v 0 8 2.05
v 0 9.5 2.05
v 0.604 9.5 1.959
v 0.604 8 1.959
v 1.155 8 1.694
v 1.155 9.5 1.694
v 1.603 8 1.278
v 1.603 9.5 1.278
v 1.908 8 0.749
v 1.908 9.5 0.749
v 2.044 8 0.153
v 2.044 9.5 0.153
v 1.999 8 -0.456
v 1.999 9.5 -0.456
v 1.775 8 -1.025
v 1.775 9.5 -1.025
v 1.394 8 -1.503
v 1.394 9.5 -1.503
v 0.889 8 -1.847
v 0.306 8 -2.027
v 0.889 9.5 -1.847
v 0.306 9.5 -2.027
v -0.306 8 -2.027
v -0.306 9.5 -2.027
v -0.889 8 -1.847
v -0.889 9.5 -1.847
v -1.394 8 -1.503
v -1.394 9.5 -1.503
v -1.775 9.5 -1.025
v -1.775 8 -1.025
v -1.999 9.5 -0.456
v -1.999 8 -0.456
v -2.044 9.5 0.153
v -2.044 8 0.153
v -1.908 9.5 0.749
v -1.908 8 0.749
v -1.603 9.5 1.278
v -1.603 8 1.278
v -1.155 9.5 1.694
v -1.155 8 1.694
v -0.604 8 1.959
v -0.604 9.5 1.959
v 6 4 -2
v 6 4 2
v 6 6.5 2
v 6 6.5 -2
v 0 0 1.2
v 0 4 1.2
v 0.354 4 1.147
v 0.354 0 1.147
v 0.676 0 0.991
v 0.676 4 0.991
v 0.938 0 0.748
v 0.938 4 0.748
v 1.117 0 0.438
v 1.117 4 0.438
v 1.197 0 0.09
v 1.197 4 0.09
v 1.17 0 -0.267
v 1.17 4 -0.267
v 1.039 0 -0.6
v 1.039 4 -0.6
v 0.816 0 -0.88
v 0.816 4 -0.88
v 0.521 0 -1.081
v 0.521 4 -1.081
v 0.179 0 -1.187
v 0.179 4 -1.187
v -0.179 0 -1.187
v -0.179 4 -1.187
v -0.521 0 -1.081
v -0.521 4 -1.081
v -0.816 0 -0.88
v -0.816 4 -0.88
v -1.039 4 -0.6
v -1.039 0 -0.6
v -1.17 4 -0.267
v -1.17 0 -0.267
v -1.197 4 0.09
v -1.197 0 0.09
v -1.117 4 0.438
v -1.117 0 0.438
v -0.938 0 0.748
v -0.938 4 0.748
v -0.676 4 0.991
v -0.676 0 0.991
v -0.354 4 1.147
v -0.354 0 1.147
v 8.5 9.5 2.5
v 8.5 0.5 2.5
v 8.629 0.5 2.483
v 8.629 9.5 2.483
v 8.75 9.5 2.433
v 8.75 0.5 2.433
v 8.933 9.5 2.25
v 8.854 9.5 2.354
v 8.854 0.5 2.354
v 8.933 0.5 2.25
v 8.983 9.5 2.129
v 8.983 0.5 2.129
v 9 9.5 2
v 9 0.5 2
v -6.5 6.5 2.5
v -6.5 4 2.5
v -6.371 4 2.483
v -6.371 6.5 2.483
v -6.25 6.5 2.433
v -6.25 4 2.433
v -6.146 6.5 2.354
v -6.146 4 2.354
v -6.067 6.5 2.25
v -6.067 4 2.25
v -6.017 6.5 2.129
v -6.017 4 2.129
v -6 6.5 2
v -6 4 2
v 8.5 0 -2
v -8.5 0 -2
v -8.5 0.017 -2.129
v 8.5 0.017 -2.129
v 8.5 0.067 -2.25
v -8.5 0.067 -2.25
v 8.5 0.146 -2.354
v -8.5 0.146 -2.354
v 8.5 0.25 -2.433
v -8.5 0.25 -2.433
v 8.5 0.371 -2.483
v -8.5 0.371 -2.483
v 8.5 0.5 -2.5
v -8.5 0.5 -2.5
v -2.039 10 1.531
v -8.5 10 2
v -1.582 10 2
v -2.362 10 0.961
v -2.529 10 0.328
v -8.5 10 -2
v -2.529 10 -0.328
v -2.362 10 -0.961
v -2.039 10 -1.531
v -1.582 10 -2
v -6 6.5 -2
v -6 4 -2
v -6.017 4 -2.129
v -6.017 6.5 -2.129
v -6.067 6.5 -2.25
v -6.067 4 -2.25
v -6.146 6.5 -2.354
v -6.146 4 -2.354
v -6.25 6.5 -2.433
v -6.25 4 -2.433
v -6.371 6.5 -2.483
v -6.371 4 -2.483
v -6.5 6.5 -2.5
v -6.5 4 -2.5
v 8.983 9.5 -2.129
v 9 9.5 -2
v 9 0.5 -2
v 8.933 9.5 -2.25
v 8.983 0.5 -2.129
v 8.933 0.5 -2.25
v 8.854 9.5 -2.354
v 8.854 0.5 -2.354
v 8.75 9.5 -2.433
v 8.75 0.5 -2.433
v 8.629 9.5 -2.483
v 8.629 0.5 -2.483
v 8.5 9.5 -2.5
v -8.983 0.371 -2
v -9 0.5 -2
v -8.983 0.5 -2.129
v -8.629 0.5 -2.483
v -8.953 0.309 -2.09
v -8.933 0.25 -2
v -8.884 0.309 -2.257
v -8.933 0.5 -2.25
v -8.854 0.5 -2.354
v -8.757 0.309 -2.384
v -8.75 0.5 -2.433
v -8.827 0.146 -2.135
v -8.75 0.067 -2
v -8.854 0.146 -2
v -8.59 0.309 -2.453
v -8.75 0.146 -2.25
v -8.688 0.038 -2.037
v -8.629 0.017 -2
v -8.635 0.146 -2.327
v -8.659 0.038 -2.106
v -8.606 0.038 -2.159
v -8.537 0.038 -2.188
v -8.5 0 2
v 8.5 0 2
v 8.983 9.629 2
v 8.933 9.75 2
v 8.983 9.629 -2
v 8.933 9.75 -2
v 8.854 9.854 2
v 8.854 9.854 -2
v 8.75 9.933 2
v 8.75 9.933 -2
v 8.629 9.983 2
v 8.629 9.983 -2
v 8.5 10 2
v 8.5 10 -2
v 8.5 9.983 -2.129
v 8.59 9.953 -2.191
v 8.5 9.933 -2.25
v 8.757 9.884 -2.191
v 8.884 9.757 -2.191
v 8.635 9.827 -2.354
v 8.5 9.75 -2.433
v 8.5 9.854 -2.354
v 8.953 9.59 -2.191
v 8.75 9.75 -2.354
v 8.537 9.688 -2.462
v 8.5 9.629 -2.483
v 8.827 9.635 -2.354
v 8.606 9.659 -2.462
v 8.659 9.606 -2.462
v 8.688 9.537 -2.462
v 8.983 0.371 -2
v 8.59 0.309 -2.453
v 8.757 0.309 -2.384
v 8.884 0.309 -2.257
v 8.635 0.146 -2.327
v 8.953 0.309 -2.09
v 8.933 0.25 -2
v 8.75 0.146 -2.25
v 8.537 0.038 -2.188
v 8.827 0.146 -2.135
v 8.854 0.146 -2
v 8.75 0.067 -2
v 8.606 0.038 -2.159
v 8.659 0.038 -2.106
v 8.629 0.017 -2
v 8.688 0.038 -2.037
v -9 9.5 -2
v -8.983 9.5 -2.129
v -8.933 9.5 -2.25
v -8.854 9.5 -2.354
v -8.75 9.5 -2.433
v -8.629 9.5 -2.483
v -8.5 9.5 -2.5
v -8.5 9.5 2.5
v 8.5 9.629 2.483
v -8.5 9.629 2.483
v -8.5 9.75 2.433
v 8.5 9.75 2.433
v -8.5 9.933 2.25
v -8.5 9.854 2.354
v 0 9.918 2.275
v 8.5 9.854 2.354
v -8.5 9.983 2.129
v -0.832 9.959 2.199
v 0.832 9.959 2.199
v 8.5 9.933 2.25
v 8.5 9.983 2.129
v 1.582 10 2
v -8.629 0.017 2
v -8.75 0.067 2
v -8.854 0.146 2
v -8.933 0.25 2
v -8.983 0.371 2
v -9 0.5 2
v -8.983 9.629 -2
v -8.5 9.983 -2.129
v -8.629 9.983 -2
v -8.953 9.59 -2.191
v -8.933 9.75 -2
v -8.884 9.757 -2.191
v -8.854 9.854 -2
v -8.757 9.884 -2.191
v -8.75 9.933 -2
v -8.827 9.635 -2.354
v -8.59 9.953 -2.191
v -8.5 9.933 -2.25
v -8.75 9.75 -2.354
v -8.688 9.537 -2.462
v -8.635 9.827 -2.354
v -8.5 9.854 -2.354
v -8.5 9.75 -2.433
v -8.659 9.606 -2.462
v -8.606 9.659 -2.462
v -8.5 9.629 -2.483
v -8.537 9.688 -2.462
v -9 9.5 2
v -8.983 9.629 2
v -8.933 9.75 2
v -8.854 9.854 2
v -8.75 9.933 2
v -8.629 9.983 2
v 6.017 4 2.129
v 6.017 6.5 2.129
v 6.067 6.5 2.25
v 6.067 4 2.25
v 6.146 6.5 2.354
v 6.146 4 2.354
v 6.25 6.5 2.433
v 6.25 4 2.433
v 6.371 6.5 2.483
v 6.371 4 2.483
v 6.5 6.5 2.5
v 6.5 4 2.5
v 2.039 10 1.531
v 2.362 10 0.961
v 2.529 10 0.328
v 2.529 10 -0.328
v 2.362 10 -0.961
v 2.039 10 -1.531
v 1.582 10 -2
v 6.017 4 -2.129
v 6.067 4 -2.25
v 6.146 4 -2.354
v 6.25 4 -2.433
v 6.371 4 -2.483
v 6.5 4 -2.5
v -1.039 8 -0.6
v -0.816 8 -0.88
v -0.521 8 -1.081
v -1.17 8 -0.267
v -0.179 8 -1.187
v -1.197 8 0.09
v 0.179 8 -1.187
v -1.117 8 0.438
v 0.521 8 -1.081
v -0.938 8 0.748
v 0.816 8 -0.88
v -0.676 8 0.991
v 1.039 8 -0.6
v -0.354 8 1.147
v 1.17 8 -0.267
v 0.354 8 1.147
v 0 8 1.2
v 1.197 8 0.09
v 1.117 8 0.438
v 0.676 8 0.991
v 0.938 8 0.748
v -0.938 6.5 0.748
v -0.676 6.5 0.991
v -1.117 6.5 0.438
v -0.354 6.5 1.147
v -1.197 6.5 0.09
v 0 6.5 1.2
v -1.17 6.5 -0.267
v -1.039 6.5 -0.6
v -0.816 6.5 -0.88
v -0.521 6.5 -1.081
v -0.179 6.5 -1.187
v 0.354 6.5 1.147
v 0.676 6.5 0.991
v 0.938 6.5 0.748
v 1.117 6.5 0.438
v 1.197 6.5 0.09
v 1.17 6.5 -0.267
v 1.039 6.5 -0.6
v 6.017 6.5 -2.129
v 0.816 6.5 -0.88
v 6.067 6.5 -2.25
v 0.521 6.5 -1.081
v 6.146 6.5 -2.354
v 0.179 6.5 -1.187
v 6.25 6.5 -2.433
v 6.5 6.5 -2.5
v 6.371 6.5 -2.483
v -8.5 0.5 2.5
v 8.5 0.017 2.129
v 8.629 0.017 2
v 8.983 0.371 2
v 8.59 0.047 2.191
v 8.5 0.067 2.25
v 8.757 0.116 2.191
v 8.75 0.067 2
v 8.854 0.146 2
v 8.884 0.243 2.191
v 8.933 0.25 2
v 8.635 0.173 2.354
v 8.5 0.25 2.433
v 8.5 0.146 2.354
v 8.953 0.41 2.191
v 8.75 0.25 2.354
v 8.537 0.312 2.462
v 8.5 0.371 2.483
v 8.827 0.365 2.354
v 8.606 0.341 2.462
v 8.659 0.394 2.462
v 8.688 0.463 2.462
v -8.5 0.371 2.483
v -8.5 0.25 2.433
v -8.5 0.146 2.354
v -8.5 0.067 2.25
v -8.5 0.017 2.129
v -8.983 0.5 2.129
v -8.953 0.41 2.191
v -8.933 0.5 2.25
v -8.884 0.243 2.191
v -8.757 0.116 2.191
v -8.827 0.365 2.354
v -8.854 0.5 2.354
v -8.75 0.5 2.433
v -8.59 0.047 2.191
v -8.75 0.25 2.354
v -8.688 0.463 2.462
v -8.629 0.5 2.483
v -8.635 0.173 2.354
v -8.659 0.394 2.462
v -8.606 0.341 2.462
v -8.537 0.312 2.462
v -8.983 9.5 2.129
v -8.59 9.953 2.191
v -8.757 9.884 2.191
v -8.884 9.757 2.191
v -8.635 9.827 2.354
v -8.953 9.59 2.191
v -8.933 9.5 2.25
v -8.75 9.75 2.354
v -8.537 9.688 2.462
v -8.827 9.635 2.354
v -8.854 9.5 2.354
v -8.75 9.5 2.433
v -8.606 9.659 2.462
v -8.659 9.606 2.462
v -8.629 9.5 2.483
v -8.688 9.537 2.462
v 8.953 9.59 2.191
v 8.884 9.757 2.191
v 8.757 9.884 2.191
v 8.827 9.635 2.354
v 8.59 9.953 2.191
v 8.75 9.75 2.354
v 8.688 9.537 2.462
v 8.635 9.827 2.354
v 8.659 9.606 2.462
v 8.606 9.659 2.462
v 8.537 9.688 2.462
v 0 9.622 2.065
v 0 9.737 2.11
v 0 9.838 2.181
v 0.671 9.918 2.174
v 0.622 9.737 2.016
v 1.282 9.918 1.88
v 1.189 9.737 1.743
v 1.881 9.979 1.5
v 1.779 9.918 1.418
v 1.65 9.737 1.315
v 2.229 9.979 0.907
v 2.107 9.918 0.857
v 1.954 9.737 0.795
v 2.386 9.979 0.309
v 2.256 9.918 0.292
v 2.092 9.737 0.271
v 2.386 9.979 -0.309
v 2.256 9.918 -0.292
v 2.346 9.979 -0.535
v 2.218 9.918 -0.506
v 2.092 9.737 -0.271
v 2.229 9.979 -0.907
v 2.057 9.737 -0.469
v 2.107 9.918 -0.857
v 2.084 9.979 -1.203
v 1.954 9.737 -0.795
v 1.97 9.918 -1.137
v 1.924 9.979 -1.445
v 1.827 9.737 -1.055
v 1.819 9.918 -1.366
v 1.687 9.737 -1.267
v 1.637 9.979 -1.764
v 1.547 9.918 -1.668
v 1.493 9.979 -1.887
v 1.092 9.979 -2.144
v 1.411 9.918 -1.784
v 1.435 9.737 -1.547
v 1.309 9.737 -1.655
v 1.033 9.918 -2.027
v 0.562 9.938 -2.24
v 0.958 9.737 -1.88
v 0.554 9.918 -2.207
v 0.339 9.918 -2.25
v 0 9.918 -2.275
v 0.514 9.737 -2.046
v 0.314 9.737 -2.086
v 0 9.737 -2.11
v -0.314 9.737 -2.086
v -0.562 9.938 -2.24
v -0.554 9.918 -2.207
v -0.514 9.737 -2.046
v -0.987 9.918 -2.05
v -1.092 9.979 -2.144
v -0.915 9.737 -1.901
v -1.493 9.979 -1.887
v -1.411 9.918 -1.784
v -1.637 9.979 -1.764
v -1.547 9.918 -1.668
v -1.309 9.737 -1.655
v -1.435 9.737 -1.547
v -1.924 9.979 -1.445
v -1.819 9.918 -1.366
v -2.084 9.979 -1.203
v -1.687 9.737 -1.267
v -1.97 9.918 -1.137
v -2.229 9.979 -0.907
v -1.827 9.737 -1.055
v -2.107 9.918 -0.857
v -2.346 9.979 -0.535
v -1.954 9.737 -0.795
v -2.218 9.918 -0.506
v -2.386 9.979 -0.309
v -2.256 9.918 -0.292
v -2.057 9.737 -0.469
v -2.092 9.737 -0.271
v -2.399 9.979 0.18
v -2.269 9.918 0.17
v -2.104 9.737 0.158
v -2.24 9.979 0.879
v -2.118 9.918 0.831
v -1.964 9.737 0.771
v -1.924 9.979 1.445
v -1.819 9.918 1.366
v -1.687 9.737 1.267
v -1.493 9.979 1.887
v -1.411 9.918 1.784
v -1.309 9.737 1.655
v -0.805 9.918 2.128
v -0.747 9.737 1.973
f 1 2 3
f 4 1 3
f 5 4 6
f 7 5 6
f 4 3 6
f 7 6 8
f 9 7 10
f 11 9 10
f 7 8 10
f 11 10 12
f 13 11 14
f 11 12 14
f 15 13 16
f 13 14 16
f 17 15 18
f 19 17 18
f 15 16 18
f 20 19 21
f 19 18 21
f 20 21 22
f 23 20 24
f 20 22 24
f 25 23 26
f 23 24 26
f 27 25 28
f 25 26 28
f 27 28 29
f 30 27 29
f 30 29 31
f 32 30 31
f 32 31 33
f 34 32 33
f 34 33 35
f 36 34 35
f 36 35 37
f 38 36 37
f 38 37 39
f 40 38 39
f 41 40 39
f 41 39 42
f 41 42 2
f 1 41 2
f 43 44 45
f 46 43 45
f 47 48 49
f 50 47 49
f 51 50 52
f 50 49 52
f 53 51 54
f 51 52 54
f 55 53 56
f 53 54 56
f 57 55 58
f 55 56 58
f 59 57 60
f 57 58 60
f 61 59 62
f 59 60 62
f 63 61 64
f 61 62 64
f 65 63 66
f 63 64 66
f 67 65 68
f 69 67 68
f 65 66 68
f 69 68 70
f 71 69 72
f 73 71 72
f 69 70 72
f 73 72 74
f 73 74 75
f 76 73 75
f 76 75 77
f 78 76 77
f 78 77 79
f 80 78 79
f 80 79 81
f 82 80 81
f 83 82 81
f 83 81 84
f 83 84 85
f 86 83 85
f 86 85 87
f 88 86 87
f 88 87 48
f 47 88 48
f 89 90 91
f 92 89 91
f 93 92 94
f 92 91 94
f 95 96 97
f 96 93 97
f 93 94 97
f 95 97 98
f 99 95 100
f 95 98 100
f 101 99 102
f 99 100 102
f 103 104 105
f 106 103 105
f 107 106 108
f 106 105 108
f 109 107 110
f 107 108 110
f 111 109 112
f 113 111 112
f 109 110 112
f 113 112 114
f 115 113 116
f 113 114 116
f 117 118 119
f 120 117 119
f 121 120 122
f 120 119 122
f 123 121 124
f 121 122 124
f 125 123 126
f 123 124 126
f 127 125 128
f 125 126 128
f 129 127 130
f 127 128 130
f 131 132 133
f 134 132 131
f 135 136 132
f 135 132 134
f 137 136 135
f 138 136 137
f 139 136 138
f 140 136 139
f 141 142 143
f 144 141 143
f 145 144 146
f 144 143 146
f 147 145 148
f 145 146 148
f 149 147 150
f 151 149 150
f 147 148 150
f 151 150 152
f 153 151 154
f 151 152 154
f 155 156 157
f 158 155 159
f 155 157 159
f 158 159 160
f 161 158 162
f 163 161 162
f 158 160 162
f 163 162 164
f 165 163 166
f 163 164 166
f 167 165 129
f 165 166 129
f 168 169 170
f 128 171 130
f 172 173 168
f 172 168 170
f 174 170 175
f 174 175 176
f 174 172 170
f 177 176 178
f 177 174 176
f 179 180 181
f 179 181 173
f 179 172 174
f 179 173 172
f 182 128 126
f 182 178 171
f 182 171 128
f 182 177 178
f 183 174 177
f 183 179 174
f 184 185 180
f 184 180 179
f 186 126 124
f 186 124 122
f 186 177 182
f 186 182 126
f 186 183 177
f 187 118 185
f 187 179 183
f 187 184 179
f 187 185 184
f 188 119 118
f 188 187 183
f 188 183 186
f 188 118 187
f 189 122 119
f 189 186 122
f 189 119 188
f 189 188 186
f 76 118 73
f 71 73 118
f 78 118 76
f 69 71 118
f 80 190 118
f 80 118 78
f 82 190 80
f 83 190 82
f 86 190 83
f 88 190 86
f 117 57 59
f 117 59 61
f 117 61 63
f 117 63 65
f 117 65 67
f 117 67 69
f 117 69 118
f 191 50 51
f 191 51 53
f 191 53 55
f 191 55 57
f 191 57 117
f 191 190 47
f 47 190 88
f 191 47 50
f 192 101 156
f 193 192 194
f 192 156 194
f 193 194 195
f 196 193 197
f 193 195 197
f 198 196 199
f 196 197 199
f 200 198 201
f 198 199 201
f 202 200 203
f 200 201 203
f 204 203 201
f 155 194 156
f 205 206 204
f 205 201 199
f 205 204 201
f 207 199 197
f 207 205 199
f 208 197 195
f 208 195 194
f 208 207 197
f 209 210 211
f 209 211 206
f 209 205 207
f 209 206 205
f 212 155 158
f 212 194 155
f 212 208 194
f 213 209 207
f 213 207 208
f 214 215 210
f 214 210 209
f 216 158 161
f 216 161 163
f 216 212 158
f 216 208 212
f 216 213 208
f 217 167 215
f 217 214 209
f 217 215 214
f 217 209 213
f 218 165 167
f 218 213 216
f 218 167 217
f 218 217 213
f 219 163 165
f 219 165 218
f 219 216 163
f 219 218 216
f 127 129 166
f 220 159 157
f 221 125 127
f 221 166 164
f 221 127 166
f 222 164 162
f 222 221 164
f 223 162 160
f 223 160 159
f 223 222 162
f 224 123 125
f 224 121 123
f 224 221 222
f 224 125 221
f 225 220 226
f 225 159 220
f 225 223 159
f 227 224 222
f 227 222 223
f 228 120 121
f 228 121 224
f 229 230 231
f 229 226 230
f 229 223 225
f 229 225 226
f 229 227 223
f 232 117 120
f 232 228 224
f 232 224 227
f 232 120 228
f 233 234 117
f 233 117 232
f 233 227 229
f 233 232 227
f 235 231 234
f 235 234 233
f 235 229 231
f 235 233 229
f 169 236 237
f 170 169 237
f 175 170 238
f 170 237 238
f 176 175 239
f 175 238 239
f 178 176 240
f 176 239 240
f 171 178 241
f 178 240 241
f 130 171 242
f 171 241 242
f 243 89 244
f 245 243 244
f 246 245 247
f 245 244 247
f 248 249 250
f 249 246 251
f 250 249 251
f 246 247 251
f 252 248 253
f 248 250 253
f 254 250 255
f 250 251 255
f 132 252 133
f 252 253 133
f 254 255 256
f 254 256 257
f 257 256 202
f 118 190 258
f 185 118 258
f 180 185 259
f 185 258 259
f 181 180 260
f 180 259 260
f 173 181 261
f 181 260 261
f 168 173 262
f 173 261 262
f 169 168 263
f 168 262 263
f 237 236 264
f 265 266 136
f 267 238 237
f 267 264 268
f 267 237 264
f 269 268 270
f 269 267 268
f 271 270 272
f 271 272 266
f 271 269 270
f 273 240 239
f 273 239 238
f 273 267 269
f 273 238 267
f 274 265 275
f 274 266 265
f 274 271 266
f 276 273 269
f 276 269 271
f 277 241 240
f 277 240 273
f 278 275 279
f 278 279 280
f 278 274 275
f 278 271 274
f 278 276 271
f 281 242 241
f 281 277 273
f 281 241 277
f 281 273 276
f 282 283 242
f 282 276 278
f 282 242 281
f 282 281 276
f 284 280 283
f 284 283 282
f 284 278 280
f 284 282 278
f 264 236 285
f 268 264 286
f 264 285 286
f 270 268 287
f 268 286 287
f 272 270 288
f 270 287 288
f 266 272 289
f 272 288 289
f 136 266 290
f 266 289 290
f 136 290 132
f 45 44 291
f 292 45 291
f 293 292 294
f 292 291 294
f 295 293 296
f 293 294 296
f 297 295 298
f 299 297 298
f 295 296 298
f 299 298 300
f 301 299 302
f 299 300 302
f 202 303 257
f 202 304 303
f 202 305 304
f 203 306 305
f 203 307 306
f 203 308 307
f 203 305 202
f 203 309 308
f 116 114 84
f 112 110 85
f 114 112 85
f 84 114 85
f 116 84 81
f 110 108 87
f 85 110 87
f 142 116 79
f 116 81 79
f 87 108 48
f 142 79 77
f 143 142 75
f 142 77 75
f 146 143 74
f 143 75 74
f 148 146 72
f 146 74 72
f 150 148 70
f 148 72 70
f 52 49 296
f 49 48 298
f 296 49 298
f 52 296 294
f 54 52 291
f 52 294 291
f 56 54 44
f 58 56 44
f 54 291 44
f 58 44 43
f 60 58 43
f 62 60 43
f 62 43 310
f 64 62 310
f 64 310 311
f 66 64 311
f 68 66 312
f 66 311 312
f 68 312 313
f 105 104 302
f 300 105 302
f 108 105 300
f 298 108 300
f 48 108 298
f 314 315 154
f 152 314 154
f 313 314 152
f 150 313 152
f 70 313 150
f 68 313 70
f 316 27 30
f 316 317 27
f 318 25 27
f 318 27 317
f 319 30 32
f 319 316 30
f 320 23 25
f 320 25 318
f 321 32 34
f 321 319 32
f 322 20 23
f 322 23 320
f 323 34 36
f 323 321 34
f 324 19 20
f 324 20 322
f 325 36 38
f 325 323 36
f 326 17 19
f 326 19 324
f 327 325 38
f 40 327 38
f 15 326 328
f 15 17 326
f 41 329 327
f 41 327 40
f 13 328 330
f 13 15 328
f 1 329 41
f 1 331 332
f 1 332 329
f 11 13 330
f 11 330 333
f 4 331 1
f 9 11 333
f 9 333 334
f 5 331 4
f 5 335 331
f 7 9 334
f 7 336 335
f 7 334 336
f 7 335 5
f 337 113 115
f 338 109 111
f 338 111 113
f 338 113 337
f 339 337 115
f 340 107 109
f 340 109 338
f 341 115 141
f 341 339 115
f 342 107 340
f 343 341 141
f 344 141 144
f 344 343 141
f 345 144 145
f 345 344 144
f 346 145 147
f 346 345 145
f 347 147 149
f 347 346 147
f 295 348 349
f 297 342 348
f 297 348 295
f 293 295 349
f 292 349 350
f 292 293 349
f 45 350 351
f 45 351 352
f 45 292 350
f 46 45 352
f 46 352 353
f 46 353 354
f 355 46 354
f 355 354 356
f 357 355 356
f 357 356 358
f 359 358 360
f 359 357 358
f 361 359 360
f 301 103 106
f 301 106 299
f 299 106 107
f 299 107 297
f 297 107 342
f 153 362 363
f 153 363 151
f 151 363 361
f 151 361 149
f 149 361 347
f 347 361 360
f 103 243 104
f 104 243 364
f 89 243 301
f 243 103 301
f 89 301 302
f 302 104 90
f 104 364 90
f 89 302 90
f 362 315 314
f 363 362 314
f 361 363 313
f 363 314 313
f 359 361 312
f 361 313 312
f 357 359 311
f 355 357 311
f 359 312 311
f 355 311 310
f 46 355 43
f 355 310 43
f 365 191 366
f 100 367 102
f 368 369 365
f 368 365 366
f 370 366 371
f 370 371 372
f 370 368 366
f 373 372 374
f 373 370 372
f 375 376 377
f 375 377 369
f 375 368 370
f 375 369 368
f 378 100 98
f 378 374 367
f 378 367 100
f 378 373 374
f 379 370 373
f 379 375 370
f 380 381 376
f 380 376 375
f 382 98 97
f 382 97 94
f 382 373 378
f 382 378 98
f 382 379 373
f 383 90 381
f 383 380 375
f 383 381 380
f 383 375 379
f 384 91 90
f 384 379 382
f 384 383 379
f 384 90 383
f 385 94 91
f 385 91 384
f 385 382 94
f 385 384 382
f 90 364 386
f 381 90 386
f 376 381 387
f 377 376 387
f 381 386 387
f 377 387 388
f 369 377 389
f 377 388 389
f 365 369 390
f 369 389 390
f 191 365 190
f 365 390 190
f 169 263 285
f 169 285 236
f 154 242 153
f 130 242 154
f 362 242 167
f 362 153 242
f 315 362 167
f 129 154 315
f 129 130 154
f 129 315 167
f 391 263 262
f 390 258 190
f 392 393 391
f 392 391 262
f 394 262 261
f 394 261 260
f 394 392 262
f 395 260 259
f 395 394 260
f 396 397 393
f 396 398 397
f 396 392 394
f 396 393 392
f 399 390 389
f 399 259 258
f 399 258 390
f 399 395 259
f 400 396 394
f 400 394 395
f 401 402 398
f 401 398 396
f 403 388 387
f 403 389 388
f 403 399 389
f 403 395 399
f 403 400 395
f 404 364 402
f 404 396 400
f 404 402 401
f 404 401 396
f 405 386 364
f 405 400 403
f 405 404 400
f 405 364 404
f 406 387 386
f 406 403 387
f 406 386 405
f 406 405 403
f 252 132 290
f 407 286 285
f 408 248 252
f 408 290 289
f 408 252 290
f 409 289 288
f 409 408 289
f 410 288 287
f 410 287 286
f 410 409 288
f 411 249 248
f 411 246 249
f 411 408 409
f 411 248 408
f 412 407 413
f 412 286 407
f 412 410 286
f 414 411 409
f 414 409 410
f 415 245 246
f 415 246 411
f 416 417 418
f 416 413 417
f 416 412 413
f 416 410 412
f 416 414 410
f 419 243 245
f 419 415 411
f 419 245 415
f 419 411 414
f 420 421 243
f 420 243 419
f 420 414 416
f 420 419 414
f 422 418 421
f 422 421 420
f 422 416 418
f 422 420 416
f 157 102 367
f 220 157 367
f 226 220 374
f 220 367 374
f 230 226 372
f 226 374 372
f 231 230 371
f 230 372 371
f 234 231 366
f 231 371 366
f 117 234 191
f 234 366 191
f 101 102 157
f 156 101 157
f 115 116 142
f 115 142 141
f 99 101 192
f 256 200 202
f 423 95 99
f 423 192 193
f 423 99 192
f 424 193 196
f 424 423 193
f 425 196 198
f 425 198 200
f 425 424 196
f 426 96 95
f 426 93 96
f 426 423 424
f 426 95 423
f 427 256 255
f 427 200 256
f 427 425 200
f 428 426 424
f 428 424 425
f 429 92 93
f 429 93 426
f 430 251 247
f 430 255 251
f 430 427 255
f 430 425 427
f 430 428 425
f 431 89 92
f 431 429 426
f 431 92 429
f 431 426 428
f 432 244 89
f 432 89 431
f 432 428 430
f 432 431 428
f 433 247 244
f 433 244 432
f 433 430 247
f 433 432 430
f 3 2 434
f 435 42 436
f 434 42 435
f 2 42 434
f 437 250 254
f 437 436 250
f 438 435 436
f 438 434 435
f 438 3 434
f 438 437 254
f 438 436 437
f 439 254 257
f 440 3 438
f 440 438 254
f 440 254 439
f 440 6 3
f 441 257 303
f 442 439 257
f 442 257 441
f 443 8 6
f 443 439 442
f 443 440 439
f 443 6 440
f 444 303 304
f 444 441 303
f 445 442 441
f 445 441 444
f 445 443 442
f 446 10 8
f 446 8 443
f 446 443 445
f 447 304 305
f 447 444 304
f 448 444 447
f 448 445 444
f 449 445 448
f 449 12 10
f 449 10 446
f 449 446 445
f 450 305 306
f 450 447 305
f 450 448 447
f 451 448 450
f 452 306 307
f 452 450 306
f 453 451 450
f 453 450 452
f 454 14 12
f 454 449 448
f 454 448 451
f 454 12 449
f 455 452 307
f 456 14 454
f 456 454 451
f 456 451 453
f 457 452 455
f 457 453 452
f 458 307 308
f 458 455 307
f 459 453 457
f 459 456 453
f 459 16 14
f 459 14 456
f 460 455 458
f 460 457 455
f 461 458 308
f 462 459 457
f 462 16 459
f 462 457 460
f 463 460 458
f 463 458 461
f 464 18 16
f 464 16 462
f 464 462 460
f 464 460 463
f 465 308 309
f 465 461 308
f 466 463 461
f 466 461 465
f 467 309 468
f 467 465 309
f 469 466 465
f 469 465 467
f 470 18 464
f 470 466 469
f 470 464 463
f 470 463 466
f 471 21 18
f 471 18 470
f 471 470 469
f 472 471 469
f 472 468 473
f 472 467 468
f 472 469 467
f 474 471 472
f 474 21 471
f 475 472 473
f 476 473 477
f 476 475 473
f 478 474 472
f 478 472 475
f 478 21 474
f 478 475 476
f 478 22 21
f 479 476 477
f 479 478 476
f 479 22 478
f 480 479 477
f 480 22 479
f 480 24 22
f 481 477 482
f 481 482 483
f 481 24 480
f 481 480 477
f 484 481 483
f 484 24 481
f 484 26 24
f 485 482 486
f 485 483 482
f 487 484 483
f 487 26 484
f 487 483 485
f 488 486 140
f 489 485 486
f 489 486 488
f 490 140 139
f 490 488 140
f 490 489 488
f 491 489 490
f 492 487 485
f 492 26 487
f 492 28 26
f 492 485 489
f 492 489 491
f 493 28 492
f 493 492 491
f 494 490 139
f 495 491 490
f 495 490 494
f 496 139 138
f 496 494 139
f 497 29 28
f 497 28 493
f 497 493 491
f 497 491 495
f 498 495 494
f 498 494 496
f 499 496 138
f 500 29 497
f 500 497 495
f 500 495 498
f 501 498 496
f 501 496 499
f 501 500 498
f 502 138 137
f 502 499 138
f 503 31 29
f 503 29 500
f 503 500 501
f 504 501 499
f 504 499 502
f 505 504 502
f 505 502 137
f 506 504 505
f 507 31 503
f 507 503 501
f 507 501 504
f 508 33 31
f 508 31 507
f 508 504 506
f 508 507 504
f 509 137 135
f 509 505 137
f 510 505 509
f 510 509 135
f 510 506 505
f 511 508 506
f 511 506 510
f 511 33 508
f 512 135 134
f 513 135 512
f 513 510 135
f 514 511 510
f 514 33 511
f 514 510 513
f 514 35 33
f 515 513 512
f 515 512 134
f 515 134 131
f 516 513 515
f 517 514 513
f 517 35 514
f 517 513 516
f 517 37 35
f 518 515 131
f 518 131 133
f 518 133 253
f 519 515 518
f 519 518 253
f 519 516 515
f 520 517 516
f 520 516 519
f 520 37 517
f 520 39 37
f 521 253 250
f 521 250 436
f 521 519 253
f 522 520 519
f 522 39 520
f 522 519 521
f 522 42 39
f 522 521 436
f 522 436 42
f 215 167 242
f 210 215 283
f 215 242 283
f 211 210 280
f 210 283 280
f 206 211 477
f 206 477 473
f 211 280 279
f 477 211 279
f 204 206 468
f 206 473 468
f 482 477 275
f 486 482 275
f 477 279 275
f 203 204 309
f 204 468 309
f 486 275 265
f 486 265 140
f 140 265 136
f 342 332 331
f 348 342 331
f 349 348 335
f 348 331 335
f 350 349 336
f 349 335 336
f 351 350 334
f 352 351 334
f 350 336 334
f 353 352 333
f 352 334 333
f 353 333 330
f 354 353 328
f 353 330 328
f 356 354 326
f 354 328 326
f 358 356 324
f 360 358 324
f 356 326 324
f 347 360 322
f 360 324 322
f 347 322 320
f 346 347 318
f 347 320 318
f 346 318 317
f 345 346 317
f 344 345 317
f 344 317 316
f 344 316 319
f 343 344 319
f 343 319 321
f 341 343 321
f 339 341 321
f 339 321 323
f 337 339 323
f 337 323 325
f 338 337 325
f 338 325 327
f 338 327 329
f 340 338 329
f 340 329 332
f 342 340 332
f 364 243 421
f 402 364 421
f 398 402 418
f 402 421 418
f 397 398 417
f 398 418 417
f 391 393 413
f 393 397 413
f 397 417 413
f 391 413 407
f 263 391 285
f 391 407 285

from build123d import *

# Parameters (mm, degrees)
SKETCH1_W           = 12
SKETCH1_H           = 5
BOSS_EXTRUDE1_DEPTH = 4
SKETCH2_W           = 3
SKETCH2_H           = 6.5
BOSS_EXTRUDE2_DEPTH = 5
SKETCH3_W           = 18
SKETCH3_H           = 5
BOSS_EXTRUDE3_DEPTH = 3.5
CUT_EXTRUDE1_REACH  = 15.684
SKETCH4_R           = 1.2
SKETCH5_R           = 2.05
CUT_EXTRUDE2_DEPTH  = 2
FILLET1_R           = 0.5


with BuildPart() as part:
    # Sketch1 → Boss-Extrude1 (new body)
    with BuildSketch(Plane(origin=(0, 0, 0), x_dir=(1, 0, 0), z_dir=(0, 1, 0))):
        Rectangle(SKETCH1_W, SKETCH1_H)
    extrude(amount=BOSS_EXTRUDE1_DEPTH)

    # Sketch2 → Boss-Extrude2 (add)
    with BuildSketch(Plane.XY.offset(2.5)):
        with Locations((-7.5, 3.25)):
            Rectangle(SKETCH2_W, SKETCH2_H)
        with Locations((7.5, 3.25)):
            Rectangle(SKETCH2_W, SKETCH2_H)
    extrude(amount=-BOSS_EXTRUDE2_DEPTH)

    # Sketch3 → Boss-Extrude3 (add)
    with BuildSketch(Plane(origin=(0, 6.5, 0), x_dir=(1, 0, 0), z_dir=(0, 1, 0))):
        Rectangle(SKETCH3_W, SKETCH3_H)
    extrude(amount=BOSS_EXTRUDE3_DEPTH)

    # Cut-Extrude1: up to this face of the body (flat: up to its plane)
    cut_extrude1_end = Plane(part.part.faces().sort_by_distance((0, 0, 0))[0])
    # Sketch4 → Cut-Extrude1 (cut, up to the picked face)
    with BuildSketch(Plane(origin=(0, 10, 0), x_dir=(1, 0, 0), z_dir=(0, 1, 0)), mode=Mode.PRIVATE) as cut_extrude1_sk1:
        with Locations(Location((0, 0, 0), (0, 0, 270))):
            Circle(SKETCH4_R)
    cut_extrude1_tool1 = split(extrude(cut_extrude1_sk1.sketch, amount=-CUT_EXTRUDE1_REACH, mode=Mode.PRIVATE), bisect_by=cut_extrude1_end, keep=Keep.BOTH, mode=Mode.PRIVATE)
    add(cut_extrude1_tool1.solids().sort_by(Axis((0, 10, 0), (0, -1, 0)))[0], mode=Mode.SUBTRACT)

    # Sketch5 → Cut-Extrude2 (cut)
    with BuildSketch(Plane(origin=(0, 10, 0), x_dir=(1, 0, 0), z_dir=(0, 1, 0))):
        with Locations(Location((0, 0, 0), (0, 0, 270))):
            Circle(SKETCH5_R)
    extrude(amount=-CUT_EXTRUDE2_DEPTH, mode=Mode.SUBTRACT)

    # Fillet1
    # the kernel refuses this fillet: 0.5 mm, written as the material it takes off along each edge
    with BuildSketch(Plane(origin=(-8.5, 0.5, 2), x_dir=(0, -1, 0), z_dir=(0, 0, 1))) as fillet1_piece_1_section:
        Polygon((0, 0), (FILLET1_R, 0), (FILLET1_R, -FILLET1_R), (0, -FILLET1_R), align=None)
    fillet1_piece_1 = extrude(amount=FILLET1_R, mode=Mode.PRIVATE)
    fillet1_piece_1 = fillet1_piece_1 - Plane(origin=(-8.5, 0.5, 2), x_dir=(0.7071067811865475, 0.7071067811865475, 0), z_dir=(0, 0, 1)) * Sphere(FILLET1_R, mode=Mode.PRIVATE)
    add(fillet1_piece_1, mode=Mode.SUBTRACT)
    with BuildSketch(Plane(origin=(-8.5, 0.5, -2), x_dir=(-1, 0, 0), z_dir=(0, -1, 0))) as fillet1_piece_2_section:
        Polygon((0, 0), (FILLET1_R, 0), (FILLET1_R, FILLET1_R), (0, FILLET1_R), align=None)
    fillet1_piece_2 = extrude(amount=FILLET1_R, mode=Mode.PRIVATE)
    fillet1_piece_2 = fillet1_piece_2 - Plane(origin=(-8.5, 0.5, -2), x_dir=(0.7071067811865475, 0, 0.7071067811865475), z_dir=(0, -1, 0)) * Sphere(FILLET1_R, mode=Mode.PRIVATE)
    add(fillet1_piece_2, mode=Mode.SUBTRACT)
    with BuildSketch(Plane(origin=(-8.5, 9.5, 2), x_dir=(-1, 0, 0), z_dir=(0, 0, 1))) as fillet1_piece_3_section:
        Polygon((0, 0), (FILLET1_R, 0), (FILLET1_R, -FILLET1_R), (0, -FILLET1_R), align=None)
    fillet1_piece_3 = extrude(amount=FILLET1_R, mode=Mode.PRIVATE)
    fillet1_piece_3 = fillet1_piece_3 - Plane(origin=(-8.5, 9.5, 2), x_dir=(0.7071067811865475, -0.7071067811865475, 0), z_dir=(0, 0, 1)) * Sphere(FILLET1_R, mode=Mode.PRIVATE)
    add(fillet1_piece_3, mode=Mode.SUBTRACT)
    with BuildSketch(Plane(origin=(-8.5, 9.5, -2), x_dir=(-1, 0, 0), z_dir=(0, 0, -1))) as fillet1_piece_4_section:
        Polygon((0, 0), (FILLET1_R, 0), (FILLET1_R, FILLET1_R), (0, FILLET1_R), align=None)
    fillet1_piece_4 = extrude(amount=FILLET1_R, mode=Mode.PRIVATE)
    fillet1_piece_4 = fillet1_piece_4 - Plane(origin=(-8.5, 9.5, -2), x_dir=(0.7071067811865475, -0.7071067811865475, 0), z_dir=(0, 0, -1)) * Sphere(FILLET1_R, mode=Mode.PRIVATE)
    add(fillet1_piece_4, mode=Mode.SUBTRACT)
    with BuildSketch(Plane(origin=(8.5, 0.5, 2), x_dir=(0, -1, 0), z_dir=(0, 0, 1))) as fillet1_piece_5_section:
        Polygon((0, 0), (FILLET1_R, 0), (FILLET1_R, FILLET1_R), (0, FILLET1_R), align=None)
    fillet1_piece_5 = extrude(amount=FILLET1_R, mode=Mode.PRIVATE)
    fillet1_piece_5 = fillet1_piece_5 - Plane(origin=(8.5, 0.5, 2), x_dir=(-0.7071067811865476, 0.7071067811865475, 0), z_dir=(0, 0, 1)) * Sphere(FILLET1_R, mode=Mode.PRIVATE)
    add(fillet1_piece_5, mode=Mode.SUBTRACT)
    with BuildSketch(Plane(origin=(8.5, 0.5, -2), x_dir=(1, 0, 0), z_dir=(0, -1, 0))) as fillet1_piece_6_section:
        Polygon((0, 0), (FILLET1_R, 0), (FILLET1_R, -FILLET1_R), (0, -FILLET1_R), align=None)
    fillet1_piece_6 = extrude(amount=FILLET1_R, mode=Mode.PRIVATE)
    fillet1_piece_6 = fillet1_piece_6 - Plane(origin=(8.5, 0.5, -2), x_dir=(-0.7071067811865475, 0, 0.7071067811865475), z_dir=(0, -1, 0)) * Sphere(FILLET1_R, mode=Mode.PRIVATE)
    add(fillet1_piece_6, mode=Mode.SUBTRACT)
    with BuildSketch(Plane(origin=(8.5, 9.5, 2), x_dir=(0, 1, 0), z_dir=(0, 0, 1))) as fillet1_piece_7_section:
        Polygon((0, 0), (FILLET1_R, 0), (FILLET1_R, -FILLET1_R), (0, -FILLET1_R), align=None)
    fillet1_piece_7 = extrude(amount=FILLET1_R, mode=Mode.PRIVATE)
    fillet1_piece_7 = fillet1_piece_7 - Plane(origin=(8.5, 9.5, 2), x_dir=(-0.7071067811865475, -0.7071067811865477, 0), z_dir=(0, 0, 1)) * Sphere(FILLET1_R, mode=Mode.PRIVATE)
    add(fillet1_piece_7, mode=Mode.SUBTRACT)
    with BuildSketch(Plane(origin=(8.5, 9.5, -2), x_dir=(0, 1, 0), z_dir=(0, 0, -1))) as fillet1_piece_8_section:
        Polygon((0, 0), (FILLET1_R, 0), (FILLET1_R, FILLET1_R), (0, FILLET1_R), align=None)
    fillet1_piece_8 = extrude(amount=FILLET1_R, mode=Mode.PRIVATE)
    fillet1_piece_8 = fillet1_piece_8 - Plane(origin=(8.5, 9.5, -2), x_dir=(-0.7071067811865475, -0.7071067811865477, 0), z_dir=(0, 0, -1)) * Sphere(FILLET1_R, mode=Mode.PRIVATE)
    add(fillet1_piece_8, mode=Mode.SUBTRACT)
    with BuildSketch(Plane(origin=(-9, 0, 2), x_dir=(1, 0, 0), z_dir=(0, 0, -1)), Plane(origin=(-9, 10, 2), x_dir=(0, -1, 0), z_dir=(0, 0, -1))) as fillet1_piece_9:
        with BuildLine():
            CenterArc((FILLET1_R, -FILLET1_R), FILLET1_R, 90, 90)
            Line((0, -FILLET1_R), (0, 0))
            Line((0, 0), (FILLET1_R, 0))
        make_face()
    extrude(amount=4, mode=Mode.SUBTRACT)
    with BuildSketch(Plane(origin=(-6, 4, 2.5), x_dir=(-1, 0, 0), z_dir=(0, 1, 0)), Plane(origin=(-6, 4, -2.5), x_dir=(0, 0, 1), z_dir=(0, 1, 0))) as fillet1_piece_10:
        with BuildLine():
            CenterArc((FILLET1_R, -FILLET1_R), FILLET1_R, 90, 90)
            Line((0, -FILLET1_R), (0, 0))
            Line((0, 0), (FILLET1_R, 0))
        make_face()
    extrude(amount=2.5, mode=Mode.SUBTRACT)
    with BuildSketch(Plane(origin=(-9, 9.5, 2.5), x_dir=(1, 0, 0), z_dir=(0, -1, 0)), Plane(origin=(-9, 9.5, -2.5), x_dir=(0, 0, 1), z_dir=(0, -1, 0)), Plane(origin=(9, 0.5, 2.5), x_dir=(-1, 0, 0), z_dir=(0, 1, 0)), Plane(origin=(9, 0.5, -2.5), x_dir=(0, 0, 1), z_dir=(0, 1, 0))) as fillet1_piece_11:
        with BuildLine():
            CenterArc((FILLET1_R, -FILLET1_R), FILLET1_R, 90, 90)
            Line((0, -FILLET1_R), (0, 0))
            Line((0, 0), (FILLET1_R, 0))
        make_face()
    extrude(amount=9, mode=Mode.SUBTRACT)
    with BuildSketch(Plane(origin=(9, 0, 2), x_dir=(-1, 0, 0), z_dir=(0, 0, -1)), Plane(origin=(9, 10, -2), x_dir=(-1, 0, 0), z_dir=(0, 0, 1))) as fillet1_piece_12:
        with BuildLine():
            CenterArc((FILLET1_R, FILLET1_R), FILLET1_R, 180, 90)
            Line((0, FILLET1_R), (0, 0))
            Line((0, 0), (FILLET1_R, 0))
        make_face()
    extrude(amount=4, mode=Mode.SUBTRACT)
    with BuildSketch(Plane(origin=(6, 4, 2.5), x_dir=(1, 0, 0), z_dir=(0, 1, 0)), Plane(origin=(6, 4, -2.5), x_dir=(0, 0, 1), z_dir=(0, 1, 0))) as fillet1_piece_13:
        with BuildLine():
            CenterArc((FILLET1_R, FILLET1_R), FILLET1_R, 180, 90)
            Line((0, FILLET1_R), (0, 0))
            Line((0, 0), (FILLET1_R, 0))
        make_face()
    extrude(amount=2.5, mode=Mode.SUBTRACT)
    with BuildSketch(Plane(origin=(8.5, 10, 2.5), x_dir=(0, -1, 0), z_dir=(-1, 0, 0)), Plane(origin=(-8.5, 0, 2.5), x_dir=(0, 1, 0), z_dir=(1, 0, 0)), Plane(origin=(-8.5, 0, -2.5), x_dir=(0, 0, 1), z_dir=(1, 0, 0))) as fillet1_piece_14:
        with BuildLine():
            CenterArc((FILLET1_R, -FILLET1_R), FILLET1_R, 90, 90)
            Line((0, -FILLET1_R), (0, 0))
            Line((0, 0), (FILLET1_R, 0))
        make_face()
    extrude(amount=17, mode=Mode.SUBTRACT)
    with BuildSketch(Plane(origin=(-8.5, 10, -2.5), x_dir=(0, 0, 1), z_dir=(1, 0, 0))) as fillet1_piece_15:
        with BuildLine():
            CenterArc((FILLET1_R, FILLET1_R), FILLET1_R, 180, 90)
            Line((0, FILLET1_R), (0, 0))
            Line((0, 0), (FILLET1_R, 0))
        make_face()
    extrude(amount=17, mode=Mode.SUBTRACT)
    with BuildSketch(Plane(origin=(0, 10, 0), x_dir=(0, 0, 1), z_dir=(-1, 0, 0))) as fillet1_piece_16:
        with BuildLine():
            CenterArc((2.05 + FILLET1_R, -FILLET1_R), FILLET1_R, 90, 90)
            Line((2.05, -FILLET1_R), (2.05, 0))
            Line((2.05, 0), (2.05 + FILLET1_R, 0))
        make_face()
    revolve(axis=Axis((0, 10, 0), (0, 1, 0)), mode=Mode.SUBTRACT)


solid = part.part
